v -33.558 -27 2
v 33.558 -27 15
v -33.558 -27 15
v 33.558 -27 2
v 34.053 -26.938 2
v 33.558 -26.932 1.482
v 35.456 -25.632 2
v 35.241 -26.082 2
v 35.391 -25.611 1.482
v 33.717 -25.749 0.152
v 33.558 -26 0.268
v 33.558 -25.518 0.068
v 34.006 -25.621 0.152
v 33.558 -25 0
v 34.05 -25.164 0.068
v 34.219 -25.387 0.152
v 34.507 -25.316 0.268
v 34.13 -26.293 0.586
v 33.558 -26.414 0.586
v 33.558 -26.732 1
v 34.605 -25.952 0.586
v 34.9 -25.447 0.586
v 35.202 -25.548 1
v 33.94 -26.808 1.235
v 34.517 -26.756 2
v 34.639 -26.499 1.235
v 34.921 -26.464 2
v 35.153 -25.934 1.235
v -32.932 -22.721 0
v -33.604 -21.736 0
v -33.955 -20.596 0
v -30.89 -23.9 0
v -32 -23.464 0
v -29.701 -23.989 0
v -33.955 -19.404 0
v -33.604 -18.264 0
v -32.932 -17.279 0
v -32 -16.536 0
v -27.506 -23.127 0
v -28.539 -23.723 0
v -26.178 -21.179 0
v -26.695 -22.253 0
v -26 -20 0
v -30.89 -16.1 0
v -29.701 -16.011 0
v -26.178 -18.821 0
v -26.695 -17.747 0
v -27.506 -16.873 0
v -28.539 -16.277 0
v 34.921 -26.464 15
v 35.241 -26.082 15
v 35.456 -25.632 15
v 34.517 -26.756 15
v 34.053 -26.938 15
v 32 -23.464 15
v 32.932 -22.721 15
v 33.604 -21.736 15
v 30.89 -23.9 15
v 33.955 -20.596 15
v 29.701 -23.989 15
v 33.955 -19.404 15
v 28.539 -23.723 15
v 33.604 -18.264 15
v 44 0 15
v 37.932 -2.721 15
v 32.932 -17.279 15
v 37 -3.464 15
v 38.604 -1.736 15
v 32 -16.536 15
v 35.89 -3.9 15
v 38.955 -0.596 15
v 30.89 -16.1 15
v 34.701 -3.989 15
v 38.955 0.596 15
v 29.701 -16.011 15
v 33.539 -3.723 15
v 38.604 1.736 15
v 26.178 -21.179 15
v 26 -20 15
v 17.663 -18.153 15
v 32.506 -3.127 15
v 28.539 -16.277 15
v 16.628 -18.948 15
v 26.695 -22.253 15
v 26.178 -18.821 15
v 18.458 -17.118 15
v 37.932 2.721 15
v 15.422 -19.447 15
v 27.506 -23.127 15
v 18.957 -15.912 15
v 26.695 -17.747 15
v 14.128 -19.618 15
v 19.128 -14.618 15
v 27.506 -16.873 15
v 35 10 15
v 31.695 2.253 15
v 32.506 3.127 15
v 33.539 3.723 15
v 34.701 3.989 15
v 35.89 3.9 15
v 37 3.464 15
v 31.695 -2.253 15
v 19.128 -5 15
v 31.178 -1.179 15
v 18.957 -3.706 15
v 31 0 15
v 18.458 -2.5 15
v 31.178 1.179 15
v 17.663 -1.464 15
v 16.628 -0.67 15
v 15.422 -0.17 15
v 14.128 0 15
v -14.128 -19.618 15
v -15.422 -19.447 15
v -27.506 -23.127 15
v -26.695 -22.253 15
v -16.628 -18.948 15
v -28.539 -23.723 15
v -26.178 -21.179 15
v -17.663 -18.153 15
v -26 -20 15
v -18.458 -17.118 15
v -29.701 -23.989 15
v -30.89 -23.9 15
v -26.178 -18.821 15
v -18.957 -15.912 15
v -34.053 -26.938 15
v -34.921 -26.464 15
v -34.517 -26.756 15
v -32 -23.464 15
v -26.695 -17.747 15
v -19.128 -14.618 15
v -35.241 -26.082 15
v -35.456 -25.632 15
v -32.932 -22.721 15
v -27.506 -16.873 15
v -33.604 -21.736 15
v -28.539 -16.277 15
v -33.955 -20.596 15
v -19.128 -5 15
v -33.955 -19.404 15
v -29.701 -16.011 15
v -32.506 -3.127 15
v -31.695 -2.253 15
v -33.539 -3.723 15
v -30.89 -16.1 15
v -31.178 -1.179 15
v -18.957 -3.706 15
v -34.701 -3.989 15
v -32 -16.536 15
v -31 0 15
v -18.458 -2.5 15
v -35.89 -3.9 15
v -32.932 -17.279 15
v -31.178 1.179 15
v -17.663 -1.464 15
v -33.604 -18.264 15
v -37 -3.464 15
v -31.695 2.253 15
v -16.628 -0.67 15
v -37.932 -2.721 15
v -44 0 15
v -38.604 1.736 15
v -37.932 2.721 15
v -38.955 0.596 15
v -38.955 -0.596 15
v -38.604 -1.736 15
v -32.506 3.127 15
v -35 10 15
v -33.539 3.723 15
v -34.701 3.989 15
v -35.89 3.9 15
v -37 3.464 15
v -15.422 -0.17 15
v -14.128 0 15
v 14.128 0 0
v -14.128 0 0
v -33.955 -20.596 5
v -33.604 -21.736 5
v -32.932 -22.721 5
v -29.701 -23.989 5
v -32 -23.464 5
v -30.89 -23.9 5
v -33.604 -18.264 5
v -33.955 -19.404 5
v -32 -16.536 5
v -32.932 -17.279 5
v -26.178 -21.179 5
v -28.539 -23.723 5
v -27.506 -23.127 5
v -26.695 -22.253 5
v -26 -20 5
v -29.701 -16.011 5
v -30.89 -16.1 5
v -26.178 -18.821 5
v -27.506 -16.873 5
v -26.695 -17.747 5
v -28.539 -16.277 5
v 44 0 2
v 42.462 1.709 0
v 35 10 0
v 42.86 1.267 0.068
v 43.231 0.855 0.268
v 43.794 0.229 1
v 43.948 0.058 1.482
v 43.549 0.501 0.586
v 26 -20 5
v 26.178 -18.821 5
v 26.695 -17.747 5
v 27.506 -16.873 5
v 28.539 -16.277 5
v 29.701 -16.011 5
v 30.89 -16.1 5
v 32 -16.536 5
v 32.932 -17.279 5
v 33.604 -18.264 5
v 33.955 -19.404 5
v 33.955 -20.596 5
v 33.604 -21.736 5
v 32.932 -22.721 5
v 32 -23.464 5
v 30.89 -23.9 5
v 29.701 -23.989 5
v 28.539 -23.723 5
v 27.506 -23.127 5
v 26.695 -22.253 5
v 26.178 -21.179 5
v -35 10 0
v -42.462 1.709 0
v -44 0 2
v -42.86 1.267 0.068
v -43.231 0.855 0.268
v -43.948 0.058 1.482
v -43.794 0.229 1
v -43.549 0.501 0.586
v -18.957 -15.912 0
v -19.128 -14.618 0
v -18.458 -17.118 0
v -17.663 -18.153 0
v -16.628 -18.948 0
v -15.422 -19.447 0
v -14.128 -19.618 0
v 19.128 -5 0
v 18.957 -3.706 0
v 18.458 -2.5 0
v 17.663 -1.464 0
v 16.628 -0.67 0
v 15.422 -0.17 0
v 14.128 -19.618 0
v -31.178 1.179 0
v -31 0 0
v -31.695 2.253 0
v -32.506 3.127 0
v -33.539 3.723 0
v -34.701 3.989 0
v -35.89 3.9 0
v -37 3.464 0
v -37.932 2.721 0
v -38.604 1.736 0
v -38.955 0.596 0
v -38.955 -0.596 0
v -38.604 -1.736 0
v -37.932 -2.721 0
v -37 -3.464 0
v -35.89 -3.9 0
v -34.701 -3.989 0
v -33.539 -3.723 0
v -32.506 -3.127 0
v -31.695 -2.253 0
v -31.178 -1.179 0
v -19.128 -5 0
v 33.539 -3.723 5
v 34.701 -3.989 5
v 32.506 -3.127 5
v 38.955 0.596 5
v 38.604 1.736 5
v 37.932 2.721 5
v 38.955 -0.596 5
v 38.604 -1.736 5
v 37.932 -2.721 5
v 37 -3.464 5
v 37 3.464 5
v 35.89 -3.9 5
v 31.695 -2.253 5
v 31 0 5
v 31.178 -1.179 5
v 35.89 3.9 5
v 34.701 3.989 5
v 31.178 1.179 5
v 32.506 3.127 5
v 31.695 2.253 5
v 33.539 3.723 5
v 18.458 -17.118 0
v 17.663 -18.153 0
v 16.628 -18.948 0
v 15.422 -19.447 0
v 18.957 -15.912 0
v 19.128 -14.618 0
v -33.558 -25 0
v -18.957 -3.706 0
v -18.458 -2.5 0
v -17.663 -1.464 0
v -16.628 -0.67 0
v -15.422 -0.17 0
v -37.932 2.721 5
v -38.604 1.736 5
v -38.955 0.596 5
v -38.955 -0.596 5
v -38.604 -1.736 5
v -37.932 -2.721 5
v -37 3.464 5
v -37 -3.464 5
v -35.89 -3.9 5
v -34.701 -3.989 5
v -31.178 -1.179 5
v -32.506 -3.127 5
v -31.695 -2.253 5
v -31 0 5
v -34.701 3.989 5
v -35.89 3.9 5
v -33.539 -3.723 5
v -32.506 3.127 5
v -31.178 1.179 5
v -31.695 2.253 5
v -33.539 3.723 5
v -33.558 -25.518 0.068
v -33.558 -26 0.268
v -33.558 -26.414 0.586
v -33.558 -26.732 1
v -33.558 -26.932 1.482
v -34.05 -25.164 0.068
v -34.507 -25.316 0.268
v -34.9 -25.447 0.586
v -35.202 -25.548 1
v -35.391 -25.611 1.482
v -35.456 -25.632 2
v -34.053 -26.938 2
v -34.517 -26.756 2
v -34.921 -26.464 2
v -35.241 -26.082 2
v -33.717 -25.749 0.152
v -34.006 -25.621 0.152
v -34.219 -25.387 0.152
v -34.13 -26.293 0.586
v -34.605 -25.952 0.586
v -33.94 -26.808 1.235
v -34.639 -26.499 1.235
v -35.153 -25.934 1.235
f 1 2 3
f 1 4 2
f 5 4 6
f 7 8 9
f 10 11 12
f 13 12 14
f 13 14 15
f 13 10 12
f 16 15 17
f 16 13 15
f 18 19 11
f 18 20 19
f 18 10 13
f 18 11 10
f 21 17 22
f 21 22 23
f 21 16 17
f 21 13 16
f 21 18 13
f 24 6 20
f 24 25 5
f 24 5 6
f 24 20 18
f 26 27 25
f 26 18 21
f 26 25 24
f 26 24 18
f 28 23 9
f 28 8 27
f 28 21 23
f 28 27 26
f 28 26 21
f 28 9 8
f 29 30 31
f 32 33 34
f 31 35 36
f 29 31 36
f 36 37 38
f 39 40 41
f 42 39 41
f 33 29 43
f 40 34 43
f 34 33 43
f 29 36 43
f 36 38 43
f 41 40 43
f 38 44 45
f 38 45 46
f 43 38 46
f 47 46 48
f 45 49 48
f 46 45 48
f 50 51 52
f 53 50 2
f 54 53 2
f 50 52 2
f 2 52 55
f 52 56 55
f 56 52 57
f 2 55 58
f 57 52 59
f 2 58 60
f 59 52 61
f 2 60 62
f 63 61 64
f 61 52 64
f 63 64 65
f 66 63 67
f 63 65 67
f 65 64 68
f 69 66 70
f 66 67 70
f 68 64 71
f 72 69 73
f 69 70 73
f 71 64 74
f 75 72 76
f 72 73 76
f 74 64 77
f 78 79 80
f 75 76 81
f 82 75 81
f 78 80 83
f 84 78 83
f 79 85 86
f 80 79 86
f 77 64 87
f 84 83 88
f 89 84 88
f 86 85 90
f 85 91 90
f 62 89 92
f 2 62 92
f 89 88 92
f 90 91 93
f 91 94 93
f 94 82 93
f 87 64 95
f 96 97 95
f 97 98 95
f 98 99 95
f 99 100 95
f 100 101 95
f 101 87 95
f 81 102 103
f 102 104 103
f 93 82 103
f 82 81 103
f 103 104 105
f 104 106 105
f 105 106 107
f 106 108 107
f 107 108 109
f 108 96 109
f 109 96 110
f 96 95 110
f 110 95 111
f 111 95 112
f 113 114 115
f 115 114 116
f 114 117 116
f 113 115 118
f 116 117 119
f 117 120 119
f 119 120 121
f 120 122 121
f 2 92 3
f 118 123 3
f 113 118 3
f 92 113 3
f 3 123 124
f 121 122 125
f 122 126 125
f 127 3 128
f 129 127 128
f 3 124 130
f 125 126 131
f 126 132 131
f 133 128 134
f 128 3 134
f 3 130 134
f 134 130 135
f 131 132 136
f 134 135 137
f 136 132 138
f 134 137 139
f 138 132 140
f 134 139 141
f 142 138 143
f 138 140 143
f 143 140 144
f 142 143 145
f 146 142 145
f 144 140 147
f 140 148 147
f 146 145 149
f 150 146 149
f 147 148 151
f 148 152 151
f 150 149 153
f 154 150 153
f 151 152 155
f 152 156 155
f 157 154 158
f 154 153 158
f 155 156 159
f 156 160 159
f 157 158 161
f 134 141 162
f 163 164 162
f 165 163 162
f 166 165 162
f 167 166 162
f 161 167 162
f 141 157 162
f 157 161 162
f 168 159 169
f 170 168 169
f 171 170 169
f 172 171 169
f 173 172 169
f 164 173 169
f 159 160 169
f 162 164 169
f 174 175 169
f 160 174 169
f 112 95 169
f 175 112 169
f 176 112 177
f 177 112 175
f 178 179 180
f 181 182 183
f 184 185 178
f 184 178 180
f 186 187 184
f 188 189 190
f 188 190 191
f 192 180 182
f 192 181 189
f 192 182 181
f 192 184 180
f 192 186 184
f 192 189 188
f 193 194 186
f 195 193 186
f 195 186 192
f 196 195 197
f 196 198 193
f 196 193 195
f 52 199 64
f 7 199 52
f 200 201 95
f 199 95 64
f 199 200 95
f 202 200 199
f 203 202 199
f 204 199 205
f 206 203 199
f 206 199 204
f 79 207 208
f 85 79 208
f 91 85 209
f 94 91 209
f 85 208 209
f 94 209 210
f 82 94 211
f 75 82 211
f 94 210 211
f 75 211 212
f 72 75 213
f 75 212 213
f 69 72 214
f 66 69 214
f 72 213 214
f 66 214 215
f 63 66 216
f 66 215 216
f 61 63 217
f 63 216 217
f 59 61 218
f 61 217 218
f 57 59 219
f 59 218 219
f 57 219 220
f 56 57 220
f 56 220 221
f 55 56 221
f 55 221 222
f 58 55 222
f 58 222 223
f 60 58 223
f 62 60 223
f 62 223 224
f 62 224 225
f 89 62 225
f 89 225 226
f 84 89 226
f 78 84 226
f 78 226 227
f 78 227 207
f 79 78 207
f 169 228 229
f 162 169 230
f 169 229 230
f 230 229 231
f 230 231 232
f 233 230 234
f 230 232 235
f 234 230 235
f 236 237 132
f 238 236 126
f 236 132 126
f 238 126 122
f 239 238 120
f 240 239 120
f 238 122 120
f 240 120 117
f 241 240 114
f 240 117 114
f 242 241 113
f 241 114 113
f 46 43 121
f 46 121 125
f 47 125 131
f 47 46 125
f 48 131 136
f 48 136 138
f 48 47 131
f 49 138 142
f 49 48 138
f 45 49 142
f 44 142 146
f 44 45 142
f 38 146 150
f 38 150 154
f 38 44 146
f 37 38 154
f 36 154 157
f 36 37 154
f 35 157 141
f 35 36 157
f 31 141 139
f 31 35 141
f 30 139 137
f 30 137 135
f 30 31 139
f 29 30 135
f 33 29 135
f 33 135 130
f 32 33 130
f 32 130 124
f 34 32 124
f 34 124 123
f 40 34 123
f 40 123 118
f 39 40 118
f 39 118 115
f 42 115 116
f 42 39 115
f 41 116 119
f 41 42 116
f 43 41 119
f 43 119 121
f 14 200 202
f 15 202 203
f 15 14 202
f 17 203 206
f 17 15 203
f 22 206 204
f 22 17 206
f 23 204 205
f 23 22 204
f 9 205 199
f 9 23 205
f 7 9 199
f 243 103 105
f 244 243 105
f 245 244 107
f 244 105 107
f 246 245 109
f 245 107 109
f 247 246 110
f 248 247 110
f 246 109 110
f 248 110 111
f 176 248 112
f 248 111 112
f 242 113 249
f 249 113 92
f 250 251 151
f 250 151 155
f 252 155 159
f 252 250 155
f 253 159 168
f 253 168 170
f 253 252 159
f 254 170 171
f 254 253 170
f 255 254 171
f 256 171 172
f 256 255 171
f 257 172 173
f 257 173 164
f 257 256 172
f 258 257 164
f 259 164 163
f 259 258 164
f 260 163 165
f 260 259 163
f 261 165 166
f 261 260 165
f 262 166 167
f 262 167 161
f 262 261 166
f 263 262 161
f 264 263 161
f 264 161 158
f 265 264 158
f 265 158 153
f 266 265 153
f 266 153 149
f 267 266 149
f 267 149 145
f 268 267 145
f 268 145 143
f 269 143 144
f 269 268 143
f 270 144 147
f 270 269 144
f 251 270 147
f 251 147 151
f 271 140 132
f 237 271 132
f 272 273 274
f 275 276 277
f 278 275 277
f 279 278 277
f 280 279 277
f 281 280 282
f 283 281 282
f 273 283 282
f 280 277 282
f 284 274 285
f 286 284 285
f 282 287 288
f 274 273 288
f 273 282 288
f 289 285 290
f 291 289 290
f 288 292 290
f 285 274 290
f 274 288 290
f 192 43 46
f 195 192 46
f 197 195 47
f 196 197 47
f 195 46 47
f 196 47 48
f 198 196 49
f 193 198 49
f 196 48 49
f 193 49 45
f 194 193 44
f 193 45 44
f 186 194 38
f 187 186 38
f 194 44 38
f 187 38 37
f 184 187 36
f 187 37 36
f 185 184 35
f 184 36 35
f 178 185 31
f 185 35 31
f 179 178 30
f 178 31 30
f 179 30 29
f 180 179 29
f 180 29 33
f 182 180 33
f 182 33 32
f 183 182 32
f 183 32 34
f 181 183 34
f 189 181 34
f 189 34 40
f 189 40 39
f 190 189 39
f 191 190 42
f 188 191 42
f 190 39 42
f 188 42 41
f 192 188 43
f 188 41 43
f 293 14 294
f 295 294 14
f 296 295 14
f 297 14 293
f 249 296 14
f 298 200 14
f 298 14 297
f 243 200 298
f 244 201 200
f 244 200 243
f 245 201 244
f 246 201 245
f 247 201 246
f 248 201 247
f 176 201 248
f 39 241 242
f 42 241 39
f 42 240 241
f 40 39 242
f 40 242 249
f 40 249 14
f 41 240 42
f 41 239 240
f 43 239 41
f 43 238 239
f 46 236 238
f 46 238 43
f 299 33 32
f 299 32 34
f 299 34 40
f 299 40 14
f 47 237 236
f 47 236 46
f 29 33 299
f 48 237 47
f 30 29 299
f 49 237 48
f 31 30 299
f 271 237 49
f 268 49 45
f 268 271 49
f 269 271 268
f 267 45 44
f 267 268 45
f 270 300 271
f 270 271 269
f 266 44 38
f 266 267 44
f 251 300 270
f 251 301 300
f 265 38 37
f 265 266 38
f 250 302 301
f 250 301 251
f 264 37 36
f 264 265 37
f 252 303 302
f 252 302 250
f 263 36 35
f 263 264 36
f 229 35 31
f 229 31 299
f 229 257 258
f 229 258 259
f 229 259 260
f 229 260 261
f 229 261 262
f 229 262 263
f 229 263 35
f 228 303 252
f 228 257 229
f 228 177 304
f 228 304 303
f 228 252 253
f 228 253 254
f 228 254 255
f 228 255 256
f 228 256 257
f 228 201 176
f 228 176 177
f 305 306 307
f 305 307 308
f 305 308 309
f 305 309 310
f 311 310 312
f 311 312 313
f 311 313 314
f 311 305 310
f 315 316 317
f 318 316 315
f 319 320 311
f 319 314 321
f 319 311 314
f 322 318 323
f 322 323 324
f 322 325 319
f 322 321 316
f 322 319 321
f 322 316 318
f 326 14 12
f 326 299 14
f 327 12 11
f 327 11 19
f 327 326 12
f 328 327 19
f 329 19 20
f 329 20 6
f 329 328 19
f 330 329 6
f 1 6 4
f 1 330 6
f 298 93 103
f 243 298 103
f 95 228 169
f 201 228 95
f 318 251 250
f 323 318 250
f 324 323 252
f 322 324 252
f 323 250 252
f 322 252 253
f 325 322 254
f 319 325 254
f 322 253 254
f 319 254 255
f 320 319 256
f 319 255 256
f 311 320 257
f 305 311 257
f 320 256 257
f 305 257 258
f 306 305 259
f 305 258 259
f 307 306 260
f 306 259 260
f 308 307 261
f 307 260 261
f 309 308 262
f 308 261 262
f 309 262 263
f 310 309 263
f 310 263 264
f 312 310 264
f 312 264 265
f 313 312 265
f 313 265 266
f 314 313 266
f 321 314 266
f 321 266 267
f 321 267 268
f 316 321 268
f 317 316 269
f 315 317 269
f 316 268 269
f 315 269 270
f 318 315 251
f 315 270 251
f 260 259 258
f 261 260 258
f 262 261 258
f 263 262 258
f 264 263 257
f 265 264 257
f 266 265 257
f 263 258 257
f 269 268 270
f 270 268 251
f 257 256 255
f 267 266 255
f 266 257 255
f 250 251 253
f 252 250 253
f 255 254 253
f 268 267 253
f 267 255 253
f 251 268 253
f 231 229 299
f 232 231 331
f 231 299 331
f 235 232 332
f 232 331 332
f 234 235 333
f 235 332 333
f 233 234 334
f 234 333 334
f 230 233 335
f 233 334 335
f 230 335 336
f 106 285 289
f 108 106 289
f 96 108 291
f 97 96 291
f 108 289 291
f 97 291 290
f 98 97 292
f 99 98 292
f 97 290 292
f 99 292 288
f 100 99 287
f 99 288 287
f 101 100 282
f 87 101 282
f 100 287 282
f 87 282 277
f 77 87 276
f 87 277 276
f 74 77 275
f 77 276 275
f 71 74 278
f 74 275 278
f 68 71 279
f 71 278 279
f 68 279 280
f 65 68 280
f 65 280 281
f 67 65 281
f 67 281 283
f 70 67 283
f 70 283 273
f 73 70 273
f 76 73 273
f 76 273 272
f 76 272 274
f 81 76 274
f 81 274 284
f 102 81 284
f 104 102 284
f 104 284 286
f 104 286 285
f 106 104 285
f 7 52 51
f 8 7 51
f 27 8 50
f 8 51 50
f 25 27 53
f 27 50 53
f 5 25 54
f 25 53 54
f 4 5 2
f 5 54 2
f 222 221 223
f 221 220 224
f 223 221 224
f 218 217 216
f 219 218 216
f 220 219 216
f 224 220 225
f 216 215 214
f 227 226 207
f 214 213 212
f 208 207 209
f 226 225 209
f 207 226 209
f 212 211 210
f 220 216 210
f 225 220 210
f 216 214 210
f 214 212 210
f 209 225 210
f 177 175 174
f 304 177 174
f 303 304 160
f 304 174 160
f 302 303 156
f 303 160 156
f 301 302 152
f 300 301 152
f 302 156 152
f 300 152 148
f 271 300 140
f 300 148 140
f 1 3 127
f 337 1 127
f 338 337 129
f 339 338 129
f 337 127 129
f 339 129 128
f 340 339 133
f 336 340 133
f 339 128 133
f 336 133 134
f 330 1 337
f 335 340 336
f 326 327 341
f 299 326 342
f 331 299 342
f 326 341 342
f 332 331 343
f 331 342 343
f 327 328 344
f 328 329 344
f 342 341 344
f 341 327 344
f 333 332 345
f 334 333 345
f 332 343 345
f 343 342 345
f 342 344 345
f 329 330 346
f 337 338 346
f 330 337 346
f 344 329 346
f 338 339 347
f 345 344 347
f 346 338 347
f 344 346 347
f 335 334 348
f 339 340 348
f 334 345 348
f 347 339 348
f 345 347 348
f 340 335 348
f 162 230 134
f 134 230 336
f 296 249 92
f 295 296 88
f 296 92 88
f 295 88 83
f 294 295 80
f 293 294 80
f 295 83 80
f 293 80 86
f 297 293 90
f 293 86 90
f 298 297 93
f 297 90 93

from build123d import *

# Parameters (mm, degrees)
F0_R     = 4
F1_DEPTH = 5
F2_DEPTH = 15
F4_R     = 2
F6_DEPTH = 25


with BuildPart() as f1:
    # F0 (on Top) → F1 (new body)
    with BuildSketch(Plane.XY):
        with Locations((-35, 0)):
            Circle(F0_R)
    extrude(amount=F1_DEPTH)


with BuildPart() as f1b:
    # F0 (on Top) → F1, piece 2 (new body)
    with BuildSketch(Plane.XY):
        with Locations((-30, -20)):
            Circle(F0_R)
    extrude(amount=F1_DEPTH)


with BuildPart() as f2:
    # F0 (on Top) → F2 (new body)
    with BuildSketch(Plane.XY):
        Polygon((0, 10), (-35, 10), (-44, 0), (-35, -27), (-22, -27), (0, -27), (0, 0), align=None)
        with Locations((-30, -20)):
            Circle(F0_R, mode=Mode.SUBTRACT)
        with Locations((-35, 0)):
            Circle(F0_R, mode=Mode.SUBTRACT)
    extrude(amount=F2_DEPTH)

    # F3: F2, F1, F1b across plane


with BuildPart() as f2_1:
    add(f2.part)
    add(f2.part.mirror(Plane.YZ))
    add(f1.part.mirror(Plane.YZ))
    add(f1b.part.mirror(Plane.YZ))

    # F4
    f4_edges = [f2_1.edges().sort_by_distance(p)[0] for p in [
        (0, -27, 0),
        (-39.5, -13.5, 0),
        (39.5, -13.5, 0),
        (-35, -27, 7.5),
        (35, -27, 7.5),
    ]]
    fillet(f4_edges, radius=F4_R)

    # F5 (on face) → F6 (cut)
    with BuildSketch(Plane.XY.offset(15)):
        with BuildLine():
            Line((14.1275198013, 0), (-14.1275198013, 0))
            ThreePointArc((-14.1275198013, 0), (-17.6630537072, -1.4644660941), (-19.1275198013, -5))
            Line((-19.1275198013, -5), (-19.1275198013, -14.6178462356))
            ThreePointArc((-19.1275198013, -14.6178462356), (-17.6630537072, -18.1533801416), (-14.1275198013, -19.6178462356))
            Line((-14.1275198013, -19.6178462356), (14.1275198013, -19.6178462356))
            ThreePointArc((14.1275198013, -19.6178462356), (17.6630537072, -18.1533801416), (19.1275198013, -14.6178462356))
            Line((19.1275198013, -14.6178462356), (19.1275198013, -5))
            ThreePointArc((19.1275198013, -5), (17.6630537072, -1.4644660941), (14.1275198013, 0))
        make_face()
    extrude(amount=-F6_DEPTH, mode=Mode.SUBTRACT)


solid = Compound([f1.part, f1b.part, f2_1.part])
